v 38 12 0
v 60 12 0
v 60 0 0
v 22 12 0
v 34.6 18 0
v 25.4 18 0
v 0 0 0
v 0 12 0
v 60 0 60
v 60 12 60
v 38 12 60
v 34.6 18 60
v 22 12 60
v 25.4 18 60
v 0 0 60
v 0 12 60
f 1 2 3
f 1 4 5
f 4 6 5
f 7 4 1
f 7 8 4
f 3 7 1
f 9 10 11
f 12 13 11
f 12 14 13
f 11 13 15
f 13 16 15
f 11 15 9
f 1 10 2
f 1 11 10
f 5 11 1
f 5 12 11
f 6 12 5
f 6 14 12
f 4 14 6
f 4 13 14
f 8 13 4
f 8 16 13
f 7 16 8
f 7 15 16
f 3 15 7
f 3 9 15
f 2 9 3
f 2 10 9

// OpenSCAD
$fn = 32;

// ----------------------------------------------------------------------
// V guide rail: dovetail, 60 mm wide
// ----------------------------------------------------------------------

// --- parameters (mm) ---
rail_w = 60;              // rail width, X
base_t = 12;              // base plate thickness
v_depth = 6;              // V feature depth / height
v_half_w = 8;             // half width of the V at the base face
plate_t = 60;             // rail length, Z (the extrusion height)
top_half_w = 4.6;         // half width at the dovetail top

dovetail_base = 2 * v_half_w;  // dovetail width at the base
dovetail_top = 2 * top_half_w;  // dovetail width at the top

profile = [[0, 0], [60, 0], [60, 12], [38, 12], [34.6, 18], [25.4, 18], [22, 12], [0, 12]];  // primary outline, 8 points, counter clockwise

// --- the one profile operation ---
linear_extrude(height = plate_t) polygon(points = profile);
